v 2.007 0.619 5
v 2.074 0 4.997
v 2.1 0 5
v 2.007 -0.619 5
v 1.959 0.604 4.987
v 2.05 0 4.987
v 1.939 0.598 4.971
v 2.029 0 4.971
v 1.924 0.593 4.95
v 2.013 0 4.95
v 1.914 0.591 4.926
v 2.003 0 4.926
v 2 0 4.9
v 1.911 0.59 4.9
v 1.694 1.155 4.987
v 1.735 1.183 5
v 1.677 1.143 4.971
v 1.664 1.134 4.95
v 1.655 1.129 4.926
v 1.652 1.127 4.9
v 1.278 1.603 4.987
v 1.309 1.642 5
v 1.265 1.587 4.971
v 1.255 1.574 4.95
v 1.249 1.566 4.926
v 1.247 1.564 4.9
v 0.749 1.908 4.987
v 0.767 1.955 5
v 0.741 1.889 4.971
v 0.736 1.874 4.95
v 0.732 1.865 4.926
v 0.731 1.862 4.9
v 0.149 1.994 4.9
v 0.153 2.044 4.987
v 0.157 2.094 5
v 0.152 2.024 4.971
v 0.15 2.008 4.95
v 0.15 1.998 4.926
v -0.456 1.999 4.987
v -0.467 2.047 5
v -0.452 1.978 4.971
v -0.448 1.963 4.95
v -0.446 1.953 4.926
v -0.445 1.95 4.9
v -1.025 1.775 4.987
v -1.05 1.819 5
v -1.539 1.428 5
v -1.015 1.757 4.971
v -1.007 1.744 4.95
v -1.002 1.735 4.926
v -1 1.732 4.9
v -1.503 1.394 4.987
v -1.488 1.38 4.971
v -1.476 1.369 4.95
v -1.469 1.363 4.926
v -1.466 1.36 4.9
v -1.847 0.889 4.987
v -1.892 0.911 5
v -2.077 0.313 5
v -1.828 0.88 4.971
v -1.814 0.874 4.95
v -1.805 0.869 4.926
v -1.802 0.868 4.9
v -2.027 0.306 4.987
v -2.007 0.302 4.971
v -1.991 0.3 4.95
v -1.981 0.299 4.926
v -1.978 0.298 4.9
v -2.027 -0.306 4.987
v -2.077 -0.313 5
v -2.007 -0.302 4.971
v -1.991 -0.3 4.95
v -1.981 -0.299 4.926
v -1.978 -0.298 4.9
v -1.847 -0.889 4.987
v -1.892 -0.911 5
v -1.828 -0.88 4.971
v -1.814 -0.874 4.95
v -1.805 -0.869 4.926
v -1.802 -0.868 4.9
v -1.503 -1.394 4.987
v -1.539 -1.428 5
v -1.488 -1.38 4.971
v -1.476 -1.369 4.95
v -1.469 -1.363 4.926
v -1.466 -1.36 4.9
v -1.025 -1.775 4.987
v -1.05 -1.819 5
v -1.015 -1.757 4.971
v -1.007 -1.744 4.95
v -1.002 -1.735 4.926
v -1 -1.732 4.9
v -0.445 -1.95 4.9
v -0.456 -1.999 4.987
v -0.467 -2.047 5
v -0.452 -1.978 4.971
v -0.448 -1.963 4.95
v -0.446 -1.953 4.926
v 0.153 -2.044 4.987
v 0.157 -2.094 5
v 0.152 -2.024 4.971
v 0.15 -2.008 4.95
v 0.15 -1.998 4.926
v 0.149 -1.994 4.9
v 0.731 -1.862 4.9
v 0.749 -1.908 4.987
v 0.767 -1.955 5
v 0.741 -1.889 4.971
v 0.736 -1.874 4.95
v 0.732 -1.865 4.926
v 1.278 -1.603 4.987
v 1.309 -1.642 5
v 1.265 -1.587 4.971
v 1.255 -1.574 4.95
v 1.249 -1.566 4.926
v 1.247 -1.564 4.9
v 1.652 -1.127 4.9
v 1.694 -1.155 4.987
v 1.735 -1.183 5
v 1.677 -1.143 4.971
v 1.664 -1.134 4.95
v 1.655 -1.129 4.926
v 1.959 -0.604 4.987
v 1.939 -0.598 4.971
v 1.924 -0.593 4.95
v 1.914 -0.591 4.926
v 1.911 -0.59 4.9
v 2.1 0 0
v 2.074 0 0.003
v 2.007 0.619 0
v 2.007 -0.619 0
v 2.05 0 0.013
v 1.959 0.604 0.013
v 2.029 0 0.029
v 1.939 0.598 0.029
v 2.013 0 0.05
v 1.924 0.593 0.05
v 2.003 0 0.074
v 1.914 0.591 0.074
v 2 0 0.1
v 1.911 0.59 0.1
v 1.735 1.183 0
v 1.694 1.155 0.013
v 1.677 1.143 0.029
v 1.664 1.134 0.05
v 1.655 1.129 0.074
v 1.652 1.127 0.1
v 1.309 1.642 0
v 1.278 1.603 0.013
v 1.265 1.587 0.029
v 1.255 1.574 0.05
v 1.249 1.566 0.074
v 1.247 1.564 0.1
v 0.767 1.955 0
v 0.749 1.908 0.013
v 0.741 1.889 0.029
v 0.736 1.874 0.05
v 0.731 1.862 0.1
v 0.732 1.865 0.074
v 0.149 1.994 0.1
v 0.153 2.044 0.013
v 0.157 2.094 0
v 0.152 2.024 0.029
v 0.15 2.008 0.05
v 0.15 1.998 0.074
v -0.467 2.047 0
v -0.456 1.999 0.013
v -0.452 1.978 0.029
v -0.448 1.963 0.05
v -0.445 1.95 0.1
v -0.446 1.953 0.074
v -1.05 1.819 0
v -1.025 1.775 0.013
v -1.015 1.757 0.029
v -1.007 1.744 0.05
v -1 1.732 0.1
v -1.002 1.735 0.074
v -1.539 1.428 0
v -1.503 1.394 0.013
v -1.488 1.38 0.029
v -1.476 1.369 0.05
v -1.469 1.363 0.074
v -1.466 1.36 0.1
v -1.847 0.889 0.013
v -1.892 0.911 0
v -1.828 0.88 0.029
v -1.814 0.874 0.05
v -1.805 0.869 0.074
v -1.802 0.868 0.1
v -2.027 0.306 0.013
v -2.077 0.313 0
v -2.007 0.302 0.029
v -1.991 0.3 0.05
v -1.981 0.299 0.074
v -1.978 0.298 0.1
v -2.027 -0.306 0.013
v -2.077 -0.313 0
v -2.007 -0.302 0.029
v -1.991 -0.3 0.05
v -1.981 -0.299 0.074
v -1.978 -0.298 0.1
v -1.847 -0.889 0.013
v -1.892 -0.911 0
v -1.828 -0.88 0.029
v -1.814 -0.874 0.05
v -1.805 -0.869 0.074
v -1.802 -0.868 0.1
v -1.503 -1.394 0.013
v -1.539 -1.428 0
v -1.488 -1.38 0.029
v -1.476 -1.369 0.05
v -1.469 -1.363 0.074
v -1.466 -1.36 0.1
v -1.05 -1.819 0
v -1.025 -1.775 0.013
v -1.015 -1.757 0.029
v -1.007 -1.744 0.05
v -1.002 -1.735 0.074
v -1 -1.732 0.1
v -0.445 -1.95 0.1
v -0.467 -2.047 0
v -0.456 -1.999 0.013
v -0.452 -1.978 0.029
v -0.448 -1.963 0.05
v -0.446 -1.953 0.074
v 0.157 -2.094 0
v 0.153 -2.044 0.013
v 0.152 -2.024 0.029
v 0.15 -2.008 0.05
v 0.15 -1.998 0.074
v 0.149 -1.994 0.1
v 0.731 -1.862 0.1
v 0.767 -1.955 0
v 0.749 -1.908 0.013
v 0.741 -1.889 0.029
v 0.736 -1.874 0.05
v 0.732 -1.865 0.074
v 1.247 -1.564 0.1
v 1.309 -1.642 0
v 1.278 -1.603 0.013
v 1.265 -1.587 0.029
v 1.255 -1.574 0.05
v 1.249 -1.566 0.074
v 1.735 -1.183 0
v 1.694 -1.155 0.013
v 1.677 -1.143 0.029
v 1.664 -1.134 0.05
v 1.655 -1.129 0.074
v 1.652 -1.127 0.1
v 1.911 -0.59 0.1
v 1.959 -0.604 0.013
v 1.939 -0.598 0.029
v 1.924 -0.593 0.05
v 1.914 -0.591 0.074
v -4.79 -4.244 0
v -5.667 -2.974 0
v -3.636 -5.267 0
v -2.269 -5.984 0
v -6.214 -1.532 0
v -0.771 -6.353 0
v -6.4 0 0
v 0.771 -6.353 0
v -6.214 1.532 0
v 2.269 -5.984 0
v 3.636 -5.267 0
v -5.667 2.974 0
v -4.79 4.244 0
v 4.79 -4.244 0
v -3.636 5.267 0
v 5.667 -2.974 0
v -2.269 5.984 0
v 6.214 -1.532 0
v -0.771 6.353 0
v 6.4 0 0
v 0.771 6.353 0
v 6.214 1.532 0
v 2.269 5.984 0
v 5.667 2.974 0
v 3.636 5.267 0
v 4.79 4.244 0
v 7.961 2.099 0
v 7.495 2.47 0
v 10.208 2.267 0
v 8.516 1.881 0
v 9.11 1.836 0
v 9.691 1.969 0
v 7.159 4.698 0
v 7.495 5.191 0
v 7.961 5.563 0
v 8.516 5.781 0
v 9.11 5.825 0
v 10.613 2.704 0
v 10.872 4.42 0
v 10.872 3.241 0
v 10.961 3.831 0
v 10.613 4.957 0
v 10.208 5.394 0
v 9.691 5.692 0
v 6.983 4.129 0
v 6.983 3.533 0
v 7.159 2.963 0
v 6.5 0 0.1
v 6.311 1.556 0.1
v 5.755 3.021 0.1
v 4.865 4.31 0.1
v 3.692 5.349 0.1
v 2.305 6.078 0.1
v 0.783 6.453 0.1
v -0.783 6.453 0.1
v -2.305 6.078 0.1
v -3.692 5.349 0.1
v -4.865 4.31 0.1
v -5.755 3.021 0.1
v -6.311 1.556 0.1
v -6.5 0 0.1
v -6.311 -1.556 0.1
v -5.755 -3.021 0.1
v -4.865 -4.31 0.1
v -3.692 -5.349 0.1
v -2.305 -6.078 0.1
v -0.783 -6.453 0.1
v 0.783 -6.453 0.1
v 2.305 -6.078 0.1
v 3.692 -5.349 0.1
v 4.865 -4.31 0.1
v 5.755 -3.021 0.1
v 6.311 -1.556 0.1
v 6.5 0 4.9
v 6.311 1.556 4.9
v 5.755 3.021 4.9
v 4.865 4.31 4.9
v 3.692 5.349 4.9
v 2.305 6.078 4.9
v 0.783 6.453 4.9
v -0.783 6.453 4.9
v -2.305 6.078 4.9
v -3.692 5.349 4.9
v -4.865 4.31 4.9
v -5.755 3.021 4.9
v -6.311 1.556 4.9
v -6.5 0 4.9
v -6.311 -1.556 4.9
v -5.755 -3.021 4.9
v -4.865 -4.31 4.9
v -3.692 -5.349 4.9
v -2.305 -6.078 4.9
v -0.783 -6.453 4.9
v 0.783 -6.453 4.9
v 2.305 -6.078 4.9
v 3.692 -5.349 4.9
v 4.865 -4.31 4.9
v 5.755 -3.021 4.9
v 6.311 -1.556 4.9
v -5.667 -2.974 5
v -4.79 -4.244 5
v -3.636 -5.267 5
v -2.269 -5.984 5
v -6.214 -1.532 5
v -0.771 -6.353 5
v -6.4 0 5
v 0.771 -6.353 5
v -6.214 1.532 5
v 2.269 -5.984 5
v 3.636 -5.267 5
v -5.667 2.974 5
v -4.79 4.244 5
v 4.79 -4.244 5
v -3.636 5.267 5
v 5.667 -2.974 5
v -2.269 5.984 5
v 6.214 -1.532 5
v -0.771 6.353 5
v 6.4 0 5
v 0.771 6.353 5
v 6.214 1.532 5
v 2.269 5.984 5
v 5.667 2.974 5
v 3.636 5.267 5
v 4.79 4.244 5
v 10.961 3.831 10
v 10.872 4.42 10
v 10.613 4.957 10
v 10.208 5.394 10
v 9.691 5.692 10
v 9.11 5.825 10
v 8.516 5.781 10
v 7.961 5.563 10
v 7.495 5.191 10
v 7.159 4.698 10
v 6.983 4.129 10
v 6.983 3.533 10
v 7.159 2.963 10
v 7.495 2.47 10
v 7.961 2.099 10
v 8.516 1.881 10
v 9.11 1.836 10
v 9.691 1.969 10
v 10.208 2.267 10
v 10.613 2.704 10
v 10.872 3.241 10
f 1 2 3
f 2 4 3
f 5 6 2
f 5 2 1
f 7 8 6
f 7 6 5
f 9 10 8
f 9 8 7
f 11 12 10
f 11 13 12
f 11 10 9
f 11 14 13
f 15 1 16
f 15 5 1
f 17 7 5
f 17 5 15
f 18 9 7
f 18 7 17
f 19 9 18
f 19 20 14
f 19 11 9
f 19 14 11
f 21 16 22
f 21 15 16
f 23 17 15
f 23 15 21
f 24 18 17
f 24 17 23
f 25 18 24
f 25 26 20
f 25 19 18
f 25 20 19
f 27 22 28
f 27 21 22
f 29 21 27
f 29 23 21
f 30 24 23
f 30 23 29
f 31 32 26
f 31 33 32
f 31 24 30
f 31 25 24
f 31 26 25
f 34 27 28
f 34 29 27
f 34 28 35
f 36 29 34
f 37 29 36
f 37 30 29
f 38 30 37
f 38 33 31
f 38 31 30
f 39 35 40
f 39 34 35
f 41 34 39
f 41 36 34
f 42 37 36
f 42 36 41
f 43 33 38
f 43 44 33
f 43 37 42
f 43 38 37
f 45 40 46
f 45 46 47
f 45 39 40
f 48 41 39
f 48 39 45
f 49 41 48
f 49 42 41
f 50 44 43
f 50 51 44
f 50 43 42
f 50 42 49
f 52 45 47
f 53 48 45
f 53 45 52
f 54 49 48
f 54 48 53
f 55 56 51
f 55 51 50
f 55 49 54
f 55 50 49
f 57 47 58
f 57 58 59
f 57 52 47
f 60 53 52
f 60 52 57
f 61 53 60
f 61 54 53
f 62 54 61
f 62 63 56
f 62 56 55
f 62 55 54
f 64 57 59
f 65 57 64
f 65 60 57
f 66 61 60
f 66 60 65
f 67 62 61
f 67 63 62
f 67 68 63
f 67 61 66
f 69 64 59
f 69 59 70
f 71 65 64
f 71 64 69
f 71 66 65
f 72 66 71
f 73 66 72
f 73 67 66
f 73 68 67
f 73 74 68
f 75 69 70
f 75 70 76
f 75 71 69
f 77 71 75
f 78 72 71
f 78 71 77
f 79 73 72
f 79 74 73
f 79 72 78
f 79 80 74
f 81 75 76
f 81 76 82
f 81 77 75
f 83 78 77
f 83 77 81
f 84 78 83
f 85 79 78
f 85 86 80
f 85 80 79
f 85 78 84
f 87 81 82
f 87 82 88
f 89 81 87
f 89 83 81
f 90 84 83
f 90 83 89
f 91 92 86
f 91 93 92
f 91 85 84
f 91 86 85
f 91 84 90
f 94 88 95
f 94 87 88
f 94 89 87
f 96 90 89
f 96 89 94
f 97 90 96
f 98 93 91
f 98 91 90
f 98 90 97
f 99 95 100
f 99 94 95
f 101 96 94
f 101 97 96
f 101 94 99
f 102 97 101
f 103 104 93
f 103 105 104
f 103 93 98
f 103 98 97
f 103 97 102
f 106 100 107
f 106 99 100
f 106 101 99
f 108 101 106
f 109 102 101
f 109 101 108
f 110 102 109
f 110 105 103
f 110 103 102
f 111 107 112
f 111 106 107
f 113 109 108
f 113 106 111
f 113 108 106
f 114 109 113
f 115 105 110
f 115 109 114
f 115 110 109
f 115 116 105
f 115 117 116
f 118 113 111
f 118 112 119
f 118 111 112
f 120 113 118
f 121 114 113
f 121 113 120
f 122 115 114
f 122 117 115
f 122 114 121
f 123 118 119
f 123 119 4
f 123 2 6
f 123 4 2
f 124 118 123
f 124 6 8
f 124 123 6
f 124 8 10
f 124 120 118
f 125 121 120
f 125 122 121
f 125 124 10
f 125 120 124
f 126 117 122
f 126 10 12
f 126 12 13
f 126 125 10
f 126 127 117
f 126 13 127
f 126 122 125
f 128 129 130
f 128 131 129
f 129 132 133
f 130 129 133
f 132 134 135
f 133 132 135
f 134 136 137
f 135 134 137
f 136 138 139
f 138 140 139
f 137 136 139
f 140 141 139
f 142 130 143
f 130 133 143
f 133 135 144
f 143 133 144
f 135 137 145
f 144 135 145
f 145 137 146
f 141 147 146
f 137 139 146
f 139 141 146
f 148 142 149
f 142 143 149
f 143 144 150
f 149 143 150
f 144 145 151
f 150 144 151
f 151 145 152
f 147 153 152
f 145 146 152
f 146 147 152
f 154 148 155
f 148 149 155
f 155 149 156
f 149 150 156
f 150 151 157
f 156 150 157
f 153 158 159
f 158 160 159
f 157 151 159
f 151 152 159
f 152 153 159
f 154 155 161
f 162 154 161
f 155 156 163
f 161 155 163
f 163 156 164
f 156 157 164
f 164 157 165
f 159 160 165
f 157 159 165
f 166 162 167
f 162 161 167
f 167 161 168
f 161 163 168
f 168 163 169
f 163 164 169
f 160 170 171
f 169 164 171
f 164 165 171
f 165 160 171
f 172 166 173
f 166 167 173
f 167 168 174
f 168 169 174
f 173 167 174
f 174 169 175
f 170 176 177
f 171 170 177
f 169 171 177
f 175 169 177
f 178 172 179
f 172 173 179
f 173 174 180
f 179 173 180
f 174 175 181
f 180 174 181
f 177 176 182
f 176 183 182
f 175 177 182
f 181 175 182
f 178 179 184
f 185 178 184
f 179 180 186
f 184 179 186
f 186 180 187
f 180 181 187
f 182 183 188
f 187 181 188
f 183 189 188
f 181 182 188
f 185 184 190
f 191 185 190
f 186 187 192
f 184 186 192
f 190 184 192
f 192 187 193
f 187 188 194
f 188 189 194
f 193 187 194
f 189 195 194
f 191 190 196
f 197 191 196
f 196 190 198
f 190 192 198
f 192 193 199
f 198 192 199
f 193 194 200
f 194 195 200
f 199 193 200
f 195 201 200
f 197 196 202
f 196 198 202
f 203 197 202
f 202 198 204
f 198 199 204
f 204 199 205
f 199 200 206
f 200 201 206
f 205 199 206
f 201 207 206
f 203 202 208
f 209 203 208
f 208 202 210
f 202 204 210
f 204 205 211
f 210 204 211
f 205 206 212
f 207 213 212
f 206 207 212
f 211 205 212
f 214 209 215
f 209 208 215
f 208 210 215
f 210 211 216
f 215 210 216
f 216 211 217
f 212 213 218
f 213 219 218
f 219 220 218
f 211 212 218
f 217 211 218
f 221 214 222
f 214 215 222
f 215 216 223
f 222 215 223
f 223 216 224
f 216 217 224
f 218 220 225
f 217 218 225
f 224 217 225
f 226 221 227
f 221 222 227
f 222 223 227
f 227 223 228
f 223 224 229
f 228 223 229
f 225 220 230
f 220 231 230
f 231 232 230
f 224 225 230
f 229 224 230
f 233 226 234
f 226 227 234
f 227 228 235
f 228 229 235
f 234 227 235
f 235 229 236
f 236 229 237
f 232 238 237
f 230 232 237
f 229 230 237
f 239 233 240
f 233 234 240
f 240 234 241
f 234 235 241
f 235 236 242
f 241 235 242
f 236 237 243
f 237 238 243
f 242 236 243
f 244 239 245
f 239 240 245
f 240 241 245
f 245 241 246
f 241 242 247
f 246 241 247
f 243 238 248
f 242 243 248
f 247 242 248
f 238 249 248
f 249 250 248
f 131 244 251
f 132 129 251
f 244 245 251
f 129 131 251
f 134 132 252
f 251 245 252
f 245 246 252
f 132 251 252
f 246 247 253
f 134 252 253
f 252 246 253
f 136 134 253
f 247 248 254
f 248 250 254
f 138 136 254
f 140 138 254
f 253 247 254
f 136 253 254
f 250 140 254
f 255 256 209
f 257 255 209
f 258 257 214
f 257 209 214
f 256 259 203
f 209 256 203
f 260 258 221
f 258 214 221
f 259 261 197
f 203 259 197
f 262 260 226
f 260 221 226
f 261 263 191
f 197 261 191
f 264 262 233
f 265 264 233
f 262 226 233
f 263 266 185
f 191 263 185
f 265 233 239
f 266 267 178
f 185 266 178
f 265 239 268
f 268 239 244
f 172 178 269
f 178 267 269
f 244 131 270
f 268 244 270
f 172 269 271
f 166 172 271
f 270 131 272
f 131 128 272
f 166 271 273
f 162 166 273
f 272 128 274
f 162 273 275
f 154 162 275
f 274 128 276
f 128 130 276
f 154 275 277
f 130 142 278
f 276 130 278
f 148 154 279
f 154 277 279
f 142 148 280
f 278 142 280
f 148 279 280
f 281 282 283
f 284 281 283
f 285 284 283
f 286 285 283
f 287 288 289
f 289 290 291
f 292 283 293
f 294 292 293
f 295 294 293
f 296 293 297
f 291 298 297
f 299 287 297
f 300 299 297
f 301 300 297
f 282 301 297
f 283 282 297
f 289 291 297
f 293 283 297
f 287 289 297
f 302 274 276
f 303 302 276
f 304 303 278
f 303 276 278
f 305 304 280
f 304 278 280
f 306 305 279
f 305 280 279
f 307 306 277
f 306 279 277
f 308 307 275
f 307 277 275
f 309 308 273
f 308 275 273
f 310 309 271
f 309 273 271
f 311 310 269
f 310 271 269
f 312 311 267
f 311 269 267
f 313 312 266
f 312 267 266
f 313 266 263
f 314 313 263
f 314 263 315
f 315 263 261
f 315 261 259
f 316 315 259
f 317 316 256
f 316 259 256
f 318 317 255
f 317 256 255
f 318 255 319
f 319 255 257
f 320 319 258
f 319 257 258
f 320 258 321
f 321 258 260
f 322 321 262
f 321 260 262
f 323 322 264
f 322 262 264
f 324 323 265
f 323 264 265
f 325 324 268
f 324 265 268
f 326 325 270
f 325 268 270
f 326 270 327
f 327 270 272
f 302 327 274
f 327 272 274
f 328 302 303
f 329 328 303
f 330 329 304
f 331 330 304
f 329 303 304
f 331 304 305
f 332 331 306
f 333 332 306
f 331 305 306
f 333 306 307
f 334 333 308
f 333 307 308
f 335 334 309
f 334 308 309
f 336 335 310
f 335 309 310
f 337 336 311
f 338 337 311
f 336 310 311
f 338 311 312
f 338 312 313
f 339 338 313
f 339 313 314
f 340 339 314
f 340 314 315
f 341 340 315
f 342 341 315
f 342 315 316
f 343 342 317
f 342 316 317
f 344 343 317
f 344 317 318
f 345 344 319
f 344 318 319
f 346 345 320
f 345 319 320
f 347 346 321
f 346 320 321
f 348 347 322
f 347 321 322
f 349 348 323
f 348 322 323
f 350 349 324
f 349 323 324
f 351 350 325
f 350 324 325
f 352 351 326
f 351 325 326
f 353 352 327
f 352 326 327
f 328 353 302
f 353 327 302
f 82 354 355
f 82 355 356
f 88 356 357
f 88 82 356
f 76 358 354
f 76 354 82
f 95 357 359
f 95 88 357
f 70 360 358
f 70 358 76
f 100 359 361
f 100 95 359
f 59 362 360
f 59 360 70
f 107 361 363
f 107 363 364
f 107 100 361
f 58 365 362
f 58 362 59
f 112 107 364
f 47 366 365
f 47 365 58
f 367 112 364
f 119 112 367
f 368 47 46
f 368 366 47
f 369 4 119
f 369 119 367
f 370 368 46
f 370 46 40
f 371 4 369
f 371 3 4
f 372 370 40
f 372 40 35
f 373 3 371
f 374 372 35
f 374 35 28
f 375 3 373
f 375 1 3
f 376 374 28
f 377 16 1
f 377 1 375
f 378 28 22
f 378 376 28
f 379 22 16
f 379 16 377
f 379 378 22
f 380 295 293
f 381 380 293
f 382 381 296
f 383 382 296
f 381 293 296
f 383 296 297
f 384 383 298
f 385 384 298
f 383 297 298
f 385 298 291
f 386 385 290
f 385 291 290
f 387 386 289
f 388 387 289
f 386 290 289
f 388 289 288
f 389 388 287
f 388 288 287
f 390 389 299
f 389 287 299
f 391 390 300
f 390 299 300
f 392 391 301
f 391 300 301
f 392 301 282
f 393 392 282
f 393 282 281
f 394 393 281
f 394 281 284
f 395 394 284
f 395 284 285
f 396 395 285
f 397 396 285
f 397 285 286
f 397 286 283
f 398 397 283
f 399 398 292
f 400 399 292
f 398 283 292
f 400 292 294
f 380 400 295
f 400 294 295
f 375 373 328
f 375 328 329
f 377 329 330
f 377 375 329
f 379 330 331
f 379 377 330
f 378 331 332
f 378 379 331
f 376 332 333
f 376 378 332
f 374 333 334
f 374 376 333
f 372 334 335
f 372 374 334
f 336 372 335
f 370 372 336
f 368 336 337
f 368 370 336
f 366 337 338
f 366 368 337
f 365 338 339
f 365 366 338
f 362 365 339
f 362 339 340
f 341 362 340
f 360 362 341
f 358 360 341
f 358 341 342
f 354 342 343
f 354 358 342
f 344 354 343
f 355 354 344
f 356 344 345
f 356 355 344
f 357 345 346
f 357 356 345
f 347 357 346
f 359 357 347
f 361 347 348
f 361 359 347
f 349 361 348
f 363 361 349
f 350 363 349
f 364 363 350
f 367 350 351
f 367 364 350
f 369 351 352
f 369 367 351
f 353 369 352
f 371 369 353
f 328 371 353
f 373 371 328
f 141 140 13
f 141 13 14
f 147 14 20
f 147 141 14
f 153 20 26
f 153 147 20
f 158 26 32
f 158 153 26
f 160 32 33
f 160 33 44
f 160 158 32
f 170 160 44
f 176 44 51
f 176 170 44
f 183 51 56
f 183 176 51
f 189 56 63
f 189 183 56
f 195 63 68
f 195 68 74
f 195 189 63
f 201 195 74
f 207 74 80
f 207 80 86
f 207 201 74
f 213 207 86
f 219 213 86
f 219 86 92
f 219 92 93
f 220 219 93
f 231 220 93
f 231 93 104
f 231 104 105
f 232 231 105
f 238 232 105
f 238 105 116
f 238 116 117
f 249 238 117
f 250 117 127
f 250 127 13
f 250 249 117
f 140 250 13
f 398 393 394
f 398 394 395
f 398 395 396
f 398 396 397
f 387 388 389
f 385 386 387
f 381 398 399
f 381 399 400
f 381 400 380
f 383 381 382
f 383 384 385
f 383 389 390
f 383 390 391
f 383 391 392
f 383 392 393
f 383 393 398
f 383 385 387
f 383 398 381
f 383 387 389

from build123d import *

# Parameters (mm, degrees)
F0_R     = 6.5
F0_R_2   = 2
F1_DEPTH = 5
F2_SIZE  = 0.1
F3_R     = 0.1
F4_R     = 2
F5_DEPTH = 10


with BuildPart() as f1:
    # F0 (on Top) → F1 (new body)
    with BuildSketch(Plane.XY):
        Circle(F0_R)
        Circle(F0_R_2, mode=Mode.SUBTRACT)
    extrude(amount=F1_DEPTH)

    # F2
    f2_edges = [f1.edges().sort_by_distance(p)[0] for p in [
        (-6.5, 0, 5),
        (-6.5, 0, 0),
    ]]
    chamfer(f2_edges, length=F2_SIZE)

    # F3
    f3_edges = [f1.edges().sort_by_distance(p)[0] for p in [
        (-2, 0, 5),
        (-2, 0, 0),
    ]]
    fillet(f3_edges, radius=F3_R)


with BuildPart() as f5:
    # F4 (on Top) → F5 (new body)
    with BuildSketch(Plane.XY):
        with Locations((8.960678, 3.830731)):
            Circle(F4_R)
    extrude(amount=F5_DEPTH)


solid = Compound([f1.part, f5.part])
